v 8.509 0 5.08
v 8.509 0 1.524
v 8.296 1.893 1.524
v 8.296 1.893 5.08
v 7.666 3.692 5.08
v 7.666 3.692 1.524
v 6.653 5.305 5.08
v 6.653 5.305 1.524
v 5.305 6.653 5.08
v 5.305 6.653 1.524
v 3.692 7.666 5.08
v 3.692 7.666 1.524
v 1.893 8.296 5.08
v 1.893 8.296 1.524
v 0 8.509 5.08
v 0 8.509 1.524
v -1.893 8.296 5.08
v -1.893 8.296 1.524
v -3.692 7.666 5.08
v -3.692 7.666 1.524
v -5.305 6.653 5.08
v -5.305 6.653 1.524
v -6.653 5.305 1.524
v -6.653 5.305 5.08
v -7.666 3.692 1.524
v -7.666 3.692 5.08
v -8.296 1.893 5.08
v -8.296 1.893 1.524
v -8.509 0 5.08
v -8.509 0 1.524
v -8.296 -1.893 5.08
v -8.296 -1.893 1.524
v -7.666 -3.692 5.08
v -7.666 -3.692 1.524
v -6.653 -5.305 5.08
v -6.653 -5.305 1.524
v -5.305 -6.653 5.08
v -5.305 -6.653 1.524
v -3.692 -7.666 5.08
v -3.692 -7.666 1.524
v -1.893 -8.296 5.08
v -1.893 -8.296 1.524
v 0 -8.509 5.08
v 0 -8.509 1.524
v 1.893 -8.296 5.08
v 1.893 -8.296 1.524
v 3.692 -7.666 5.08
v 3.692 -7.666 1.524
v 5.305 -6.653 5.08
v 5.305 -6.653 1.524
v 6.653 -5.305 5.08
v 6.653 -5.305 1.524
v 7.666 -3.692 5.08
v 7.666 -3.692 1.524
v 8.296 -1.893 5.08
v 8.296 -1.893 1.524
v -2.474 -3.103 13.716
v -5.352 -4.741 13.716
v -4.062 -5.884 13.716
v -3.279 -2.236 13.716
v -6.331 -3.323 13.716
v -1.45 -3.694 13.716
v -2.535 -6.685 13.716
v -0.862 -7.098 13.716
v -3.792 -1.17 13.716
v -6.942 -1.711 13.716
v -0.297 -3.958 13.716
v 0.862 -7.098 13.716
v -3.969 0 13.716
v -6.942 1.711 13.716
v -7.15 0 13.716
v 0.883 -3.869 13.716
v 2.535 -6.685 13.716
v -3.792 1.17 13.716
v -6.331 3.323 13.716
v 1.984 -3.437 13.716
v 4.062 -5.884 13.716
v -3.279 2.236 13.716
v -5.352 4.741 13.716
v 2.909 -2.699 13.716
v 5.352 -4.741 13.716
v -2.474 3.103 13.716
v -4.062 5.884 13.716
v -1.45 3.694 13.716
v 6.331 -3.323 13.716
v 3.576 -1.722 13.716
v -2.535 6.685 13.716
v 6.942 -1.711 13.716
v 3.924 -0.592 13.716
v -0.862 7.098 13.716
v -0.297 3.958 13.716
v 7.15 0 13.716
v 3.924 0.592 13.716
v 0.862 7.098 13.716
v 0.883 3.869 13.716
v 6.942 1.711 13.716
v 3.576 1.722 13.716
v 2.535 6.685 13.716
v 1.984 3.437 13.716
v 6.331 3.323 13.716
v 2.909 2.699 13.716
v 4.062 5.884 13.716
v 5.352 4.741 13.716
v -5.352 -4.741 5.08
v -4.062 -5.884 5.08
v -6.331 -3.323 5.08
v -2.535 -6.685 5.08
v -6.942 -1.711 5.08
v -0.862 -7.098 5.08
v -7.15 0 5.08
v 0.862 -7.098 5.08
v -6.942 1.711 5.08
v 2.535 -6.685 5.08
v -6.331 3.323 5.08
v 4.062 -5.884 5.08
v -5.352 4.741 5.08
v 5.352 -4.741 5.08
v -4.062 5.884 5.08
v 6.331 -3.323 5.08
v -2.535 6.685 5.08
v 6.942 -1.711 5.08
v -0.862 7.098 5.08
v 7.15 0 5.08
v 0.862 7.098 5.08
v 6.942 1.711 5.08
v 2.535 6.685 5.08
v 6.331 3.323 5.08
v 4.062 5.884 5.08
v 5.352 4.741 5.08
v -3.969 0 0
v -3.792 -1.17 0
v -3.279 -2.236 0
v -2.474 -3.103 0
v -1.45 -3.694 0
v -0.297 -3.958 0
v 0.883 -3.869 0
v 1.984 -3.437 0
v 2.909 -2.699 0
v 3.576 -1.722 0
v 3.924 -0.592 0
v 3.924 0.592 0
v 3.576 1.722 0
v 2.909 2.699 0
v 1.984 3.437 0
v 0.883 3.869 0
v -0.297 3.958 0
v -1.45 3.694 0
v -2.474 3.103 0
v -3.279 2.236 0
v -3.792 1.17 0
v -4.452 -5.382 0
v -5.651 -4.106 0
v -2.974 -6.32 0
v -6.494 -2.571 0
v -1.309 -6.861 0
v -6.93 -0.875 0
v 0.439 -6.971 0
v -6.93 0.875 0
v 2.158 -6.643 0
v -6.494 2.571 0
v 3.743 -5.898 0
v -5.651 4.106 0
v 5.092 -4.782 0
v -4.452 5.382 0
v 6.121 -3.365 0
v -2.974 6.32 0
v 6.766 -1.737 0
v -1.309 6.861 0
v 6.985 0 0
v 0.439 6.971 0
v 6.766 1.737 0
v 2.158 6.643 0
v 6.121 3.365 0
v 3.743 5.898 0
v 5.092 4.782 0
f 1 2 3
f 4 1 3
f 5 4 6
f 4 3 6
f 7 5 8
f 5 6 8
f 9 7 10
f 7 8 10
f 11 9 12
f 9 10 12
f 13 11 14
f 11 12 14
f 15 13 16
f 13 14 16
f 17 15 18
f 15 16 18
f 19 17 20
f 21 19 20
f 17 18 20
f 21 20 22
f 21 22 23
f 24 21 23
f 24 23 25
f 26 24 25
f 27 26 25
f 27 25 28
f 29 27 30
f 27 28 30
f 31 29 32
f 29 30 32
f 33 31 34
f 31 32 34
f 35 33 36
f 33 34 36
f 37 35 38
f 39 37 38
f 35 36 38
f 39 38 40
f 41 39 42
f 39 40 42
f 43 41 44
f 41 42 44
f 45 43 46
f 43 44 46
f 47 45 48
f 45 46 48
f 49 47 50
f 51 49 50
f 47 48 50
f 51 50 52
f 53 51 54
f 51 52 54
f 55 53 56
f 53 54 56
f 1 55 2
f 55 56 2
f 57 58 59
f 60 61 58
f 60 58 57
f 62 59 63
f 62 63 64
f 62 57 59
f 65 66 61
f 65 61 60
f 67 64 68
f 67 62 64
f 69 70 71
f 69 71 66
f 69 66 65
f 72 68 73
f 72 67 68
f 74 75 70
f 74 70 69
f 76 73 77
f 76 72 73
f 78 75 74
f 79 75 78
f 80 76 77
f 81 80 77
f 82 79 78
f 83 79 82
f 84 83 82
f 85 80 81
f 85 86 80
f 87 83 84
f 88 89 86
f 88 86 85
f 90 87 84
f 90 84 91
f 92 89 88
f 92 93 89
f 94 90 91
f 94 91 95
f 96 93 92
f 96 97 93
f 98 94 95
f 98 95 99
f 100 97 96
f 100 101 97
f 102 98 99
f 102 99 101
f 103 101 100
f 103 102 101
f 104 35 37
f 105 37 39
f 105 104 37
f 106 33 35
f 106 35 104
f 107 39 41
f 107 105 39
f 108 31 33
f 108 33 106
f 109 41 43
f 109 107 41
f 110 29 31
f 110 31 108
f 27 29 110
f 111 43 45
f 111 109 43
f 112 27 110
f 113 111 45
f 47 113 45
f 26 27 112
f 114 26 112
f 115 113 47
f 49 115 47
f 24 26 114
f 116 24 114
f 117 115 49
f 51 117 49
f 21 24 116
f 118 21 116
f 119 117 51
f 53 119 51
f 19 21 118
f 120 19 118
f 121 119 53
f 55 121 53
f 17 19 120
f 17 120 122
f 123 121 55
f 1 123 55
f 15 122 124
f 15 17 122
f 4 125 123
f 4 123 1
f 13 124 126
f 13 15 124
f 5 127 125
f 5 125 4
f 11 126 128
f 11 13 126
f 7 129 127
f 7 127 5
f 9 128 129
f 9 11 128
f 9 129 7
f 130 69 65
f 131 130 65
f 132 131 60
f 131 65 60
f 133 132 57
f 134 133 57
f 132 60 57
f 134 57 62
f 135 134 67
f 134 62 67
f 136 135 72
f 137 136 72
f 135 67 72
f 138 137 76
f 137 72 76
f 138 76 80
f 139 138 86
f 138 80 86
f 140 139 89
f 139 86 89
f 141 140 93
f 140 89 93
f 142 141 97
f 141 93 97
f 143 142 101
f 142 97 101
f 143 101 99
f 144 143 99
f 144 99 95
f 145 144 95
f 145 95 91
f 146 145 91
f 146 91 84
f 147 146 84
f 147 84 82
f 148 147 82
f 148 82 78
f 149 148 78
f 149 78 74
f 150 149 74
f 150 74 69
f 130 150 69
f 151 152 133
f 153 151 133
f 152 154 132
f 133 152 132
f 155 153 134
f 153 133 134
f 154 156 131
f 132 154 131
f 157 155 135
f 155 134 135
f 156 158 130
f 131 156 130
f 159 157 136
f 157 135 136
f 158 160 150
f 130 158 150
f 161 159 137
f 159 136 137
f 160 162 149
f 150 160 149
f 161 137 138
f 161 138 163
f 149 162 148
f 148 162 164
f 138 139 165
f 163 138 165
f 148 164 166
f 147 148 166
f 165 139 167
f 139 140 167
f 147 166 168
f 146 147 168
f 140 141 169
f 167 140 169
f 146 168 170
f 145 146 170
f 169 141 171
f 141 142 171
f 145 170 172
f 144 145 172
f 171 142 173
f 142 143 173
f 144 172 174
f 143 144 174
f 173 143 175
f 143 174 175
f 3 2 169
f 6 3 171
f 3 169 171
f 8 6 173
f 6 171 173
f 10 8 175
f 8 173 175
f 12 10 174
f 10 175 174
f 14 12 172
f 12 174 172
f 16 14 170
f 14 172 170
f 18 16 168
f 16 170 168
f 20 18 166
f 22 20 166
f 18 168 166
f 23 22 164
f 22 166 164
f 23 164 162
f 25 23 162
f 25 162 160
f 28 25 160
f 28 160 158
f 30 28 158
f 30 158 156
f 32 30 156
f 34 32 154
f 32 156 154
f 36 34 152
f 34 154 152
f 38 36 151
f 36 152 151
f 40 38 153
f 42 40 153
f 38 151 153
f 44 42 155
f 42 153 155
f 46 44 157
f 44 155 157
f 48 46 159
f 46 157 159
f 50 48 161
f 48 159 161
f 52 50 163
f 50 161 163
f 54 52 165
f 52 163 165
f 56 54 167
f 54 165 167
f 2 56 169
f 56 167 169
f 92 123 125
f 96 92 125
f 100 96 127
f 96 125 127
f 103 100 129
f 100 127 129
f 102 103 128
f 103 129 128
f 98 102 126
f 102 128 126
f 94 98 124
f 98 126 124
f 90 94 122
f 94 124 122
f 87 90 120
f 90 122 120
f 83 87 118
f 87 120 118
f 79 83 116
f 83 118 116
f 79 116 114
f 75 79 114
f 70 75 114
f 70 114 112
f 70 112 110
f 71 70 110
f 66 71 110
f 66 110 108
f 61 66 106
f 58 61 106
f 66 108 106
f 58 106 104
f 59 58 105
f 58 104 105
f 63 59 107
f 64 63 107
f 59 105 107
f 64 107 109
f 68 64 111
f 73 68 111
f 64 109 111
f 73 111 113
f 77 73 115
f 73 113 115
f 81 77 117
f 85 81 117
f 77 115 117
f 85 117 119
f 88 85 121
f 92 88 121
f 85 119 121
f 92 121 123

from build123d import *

# Parameters (mm, degrees)
F0_R     = 8.509
F1_DEPTH = 5.08
F2_R     = 7.1501
F3_DEPTH = 8.636
F5_D     = 7.9375
F6_SIZE2 = 1.524
F6_SIZE  = 1.524


with BuildPart() as f1:
    # F0 (on Top) → F1 (new body)
    with BuildSketch(Plane.XY):
        Circle(F0_R)
    extrude(amount=F1_DEPTH)

    # F2 (on face) → F3 (join)
    with BuildSketch(Plane.XY.offset(5.08)):
        Circle(F2_R)
    extrude(amount=F3_DEPTH)

    # F5 (through all)
    with Locations(Plane(origin=(0, 0, 0), x_dir=(1, 0, 0), z_dir=(0, 0, -1))):
        with Locations((0, 0)):
            Hole(F5_D / 2)

    # F6
    f6_edges = [f1.edges().sort_by_distance(p)[0] for p in [
        (-8.509, 0, 0),
    ]]
    chamfer(f6_edges, length=F6_SIZE, length2=F6_SIZE2)


solid = f1.part
